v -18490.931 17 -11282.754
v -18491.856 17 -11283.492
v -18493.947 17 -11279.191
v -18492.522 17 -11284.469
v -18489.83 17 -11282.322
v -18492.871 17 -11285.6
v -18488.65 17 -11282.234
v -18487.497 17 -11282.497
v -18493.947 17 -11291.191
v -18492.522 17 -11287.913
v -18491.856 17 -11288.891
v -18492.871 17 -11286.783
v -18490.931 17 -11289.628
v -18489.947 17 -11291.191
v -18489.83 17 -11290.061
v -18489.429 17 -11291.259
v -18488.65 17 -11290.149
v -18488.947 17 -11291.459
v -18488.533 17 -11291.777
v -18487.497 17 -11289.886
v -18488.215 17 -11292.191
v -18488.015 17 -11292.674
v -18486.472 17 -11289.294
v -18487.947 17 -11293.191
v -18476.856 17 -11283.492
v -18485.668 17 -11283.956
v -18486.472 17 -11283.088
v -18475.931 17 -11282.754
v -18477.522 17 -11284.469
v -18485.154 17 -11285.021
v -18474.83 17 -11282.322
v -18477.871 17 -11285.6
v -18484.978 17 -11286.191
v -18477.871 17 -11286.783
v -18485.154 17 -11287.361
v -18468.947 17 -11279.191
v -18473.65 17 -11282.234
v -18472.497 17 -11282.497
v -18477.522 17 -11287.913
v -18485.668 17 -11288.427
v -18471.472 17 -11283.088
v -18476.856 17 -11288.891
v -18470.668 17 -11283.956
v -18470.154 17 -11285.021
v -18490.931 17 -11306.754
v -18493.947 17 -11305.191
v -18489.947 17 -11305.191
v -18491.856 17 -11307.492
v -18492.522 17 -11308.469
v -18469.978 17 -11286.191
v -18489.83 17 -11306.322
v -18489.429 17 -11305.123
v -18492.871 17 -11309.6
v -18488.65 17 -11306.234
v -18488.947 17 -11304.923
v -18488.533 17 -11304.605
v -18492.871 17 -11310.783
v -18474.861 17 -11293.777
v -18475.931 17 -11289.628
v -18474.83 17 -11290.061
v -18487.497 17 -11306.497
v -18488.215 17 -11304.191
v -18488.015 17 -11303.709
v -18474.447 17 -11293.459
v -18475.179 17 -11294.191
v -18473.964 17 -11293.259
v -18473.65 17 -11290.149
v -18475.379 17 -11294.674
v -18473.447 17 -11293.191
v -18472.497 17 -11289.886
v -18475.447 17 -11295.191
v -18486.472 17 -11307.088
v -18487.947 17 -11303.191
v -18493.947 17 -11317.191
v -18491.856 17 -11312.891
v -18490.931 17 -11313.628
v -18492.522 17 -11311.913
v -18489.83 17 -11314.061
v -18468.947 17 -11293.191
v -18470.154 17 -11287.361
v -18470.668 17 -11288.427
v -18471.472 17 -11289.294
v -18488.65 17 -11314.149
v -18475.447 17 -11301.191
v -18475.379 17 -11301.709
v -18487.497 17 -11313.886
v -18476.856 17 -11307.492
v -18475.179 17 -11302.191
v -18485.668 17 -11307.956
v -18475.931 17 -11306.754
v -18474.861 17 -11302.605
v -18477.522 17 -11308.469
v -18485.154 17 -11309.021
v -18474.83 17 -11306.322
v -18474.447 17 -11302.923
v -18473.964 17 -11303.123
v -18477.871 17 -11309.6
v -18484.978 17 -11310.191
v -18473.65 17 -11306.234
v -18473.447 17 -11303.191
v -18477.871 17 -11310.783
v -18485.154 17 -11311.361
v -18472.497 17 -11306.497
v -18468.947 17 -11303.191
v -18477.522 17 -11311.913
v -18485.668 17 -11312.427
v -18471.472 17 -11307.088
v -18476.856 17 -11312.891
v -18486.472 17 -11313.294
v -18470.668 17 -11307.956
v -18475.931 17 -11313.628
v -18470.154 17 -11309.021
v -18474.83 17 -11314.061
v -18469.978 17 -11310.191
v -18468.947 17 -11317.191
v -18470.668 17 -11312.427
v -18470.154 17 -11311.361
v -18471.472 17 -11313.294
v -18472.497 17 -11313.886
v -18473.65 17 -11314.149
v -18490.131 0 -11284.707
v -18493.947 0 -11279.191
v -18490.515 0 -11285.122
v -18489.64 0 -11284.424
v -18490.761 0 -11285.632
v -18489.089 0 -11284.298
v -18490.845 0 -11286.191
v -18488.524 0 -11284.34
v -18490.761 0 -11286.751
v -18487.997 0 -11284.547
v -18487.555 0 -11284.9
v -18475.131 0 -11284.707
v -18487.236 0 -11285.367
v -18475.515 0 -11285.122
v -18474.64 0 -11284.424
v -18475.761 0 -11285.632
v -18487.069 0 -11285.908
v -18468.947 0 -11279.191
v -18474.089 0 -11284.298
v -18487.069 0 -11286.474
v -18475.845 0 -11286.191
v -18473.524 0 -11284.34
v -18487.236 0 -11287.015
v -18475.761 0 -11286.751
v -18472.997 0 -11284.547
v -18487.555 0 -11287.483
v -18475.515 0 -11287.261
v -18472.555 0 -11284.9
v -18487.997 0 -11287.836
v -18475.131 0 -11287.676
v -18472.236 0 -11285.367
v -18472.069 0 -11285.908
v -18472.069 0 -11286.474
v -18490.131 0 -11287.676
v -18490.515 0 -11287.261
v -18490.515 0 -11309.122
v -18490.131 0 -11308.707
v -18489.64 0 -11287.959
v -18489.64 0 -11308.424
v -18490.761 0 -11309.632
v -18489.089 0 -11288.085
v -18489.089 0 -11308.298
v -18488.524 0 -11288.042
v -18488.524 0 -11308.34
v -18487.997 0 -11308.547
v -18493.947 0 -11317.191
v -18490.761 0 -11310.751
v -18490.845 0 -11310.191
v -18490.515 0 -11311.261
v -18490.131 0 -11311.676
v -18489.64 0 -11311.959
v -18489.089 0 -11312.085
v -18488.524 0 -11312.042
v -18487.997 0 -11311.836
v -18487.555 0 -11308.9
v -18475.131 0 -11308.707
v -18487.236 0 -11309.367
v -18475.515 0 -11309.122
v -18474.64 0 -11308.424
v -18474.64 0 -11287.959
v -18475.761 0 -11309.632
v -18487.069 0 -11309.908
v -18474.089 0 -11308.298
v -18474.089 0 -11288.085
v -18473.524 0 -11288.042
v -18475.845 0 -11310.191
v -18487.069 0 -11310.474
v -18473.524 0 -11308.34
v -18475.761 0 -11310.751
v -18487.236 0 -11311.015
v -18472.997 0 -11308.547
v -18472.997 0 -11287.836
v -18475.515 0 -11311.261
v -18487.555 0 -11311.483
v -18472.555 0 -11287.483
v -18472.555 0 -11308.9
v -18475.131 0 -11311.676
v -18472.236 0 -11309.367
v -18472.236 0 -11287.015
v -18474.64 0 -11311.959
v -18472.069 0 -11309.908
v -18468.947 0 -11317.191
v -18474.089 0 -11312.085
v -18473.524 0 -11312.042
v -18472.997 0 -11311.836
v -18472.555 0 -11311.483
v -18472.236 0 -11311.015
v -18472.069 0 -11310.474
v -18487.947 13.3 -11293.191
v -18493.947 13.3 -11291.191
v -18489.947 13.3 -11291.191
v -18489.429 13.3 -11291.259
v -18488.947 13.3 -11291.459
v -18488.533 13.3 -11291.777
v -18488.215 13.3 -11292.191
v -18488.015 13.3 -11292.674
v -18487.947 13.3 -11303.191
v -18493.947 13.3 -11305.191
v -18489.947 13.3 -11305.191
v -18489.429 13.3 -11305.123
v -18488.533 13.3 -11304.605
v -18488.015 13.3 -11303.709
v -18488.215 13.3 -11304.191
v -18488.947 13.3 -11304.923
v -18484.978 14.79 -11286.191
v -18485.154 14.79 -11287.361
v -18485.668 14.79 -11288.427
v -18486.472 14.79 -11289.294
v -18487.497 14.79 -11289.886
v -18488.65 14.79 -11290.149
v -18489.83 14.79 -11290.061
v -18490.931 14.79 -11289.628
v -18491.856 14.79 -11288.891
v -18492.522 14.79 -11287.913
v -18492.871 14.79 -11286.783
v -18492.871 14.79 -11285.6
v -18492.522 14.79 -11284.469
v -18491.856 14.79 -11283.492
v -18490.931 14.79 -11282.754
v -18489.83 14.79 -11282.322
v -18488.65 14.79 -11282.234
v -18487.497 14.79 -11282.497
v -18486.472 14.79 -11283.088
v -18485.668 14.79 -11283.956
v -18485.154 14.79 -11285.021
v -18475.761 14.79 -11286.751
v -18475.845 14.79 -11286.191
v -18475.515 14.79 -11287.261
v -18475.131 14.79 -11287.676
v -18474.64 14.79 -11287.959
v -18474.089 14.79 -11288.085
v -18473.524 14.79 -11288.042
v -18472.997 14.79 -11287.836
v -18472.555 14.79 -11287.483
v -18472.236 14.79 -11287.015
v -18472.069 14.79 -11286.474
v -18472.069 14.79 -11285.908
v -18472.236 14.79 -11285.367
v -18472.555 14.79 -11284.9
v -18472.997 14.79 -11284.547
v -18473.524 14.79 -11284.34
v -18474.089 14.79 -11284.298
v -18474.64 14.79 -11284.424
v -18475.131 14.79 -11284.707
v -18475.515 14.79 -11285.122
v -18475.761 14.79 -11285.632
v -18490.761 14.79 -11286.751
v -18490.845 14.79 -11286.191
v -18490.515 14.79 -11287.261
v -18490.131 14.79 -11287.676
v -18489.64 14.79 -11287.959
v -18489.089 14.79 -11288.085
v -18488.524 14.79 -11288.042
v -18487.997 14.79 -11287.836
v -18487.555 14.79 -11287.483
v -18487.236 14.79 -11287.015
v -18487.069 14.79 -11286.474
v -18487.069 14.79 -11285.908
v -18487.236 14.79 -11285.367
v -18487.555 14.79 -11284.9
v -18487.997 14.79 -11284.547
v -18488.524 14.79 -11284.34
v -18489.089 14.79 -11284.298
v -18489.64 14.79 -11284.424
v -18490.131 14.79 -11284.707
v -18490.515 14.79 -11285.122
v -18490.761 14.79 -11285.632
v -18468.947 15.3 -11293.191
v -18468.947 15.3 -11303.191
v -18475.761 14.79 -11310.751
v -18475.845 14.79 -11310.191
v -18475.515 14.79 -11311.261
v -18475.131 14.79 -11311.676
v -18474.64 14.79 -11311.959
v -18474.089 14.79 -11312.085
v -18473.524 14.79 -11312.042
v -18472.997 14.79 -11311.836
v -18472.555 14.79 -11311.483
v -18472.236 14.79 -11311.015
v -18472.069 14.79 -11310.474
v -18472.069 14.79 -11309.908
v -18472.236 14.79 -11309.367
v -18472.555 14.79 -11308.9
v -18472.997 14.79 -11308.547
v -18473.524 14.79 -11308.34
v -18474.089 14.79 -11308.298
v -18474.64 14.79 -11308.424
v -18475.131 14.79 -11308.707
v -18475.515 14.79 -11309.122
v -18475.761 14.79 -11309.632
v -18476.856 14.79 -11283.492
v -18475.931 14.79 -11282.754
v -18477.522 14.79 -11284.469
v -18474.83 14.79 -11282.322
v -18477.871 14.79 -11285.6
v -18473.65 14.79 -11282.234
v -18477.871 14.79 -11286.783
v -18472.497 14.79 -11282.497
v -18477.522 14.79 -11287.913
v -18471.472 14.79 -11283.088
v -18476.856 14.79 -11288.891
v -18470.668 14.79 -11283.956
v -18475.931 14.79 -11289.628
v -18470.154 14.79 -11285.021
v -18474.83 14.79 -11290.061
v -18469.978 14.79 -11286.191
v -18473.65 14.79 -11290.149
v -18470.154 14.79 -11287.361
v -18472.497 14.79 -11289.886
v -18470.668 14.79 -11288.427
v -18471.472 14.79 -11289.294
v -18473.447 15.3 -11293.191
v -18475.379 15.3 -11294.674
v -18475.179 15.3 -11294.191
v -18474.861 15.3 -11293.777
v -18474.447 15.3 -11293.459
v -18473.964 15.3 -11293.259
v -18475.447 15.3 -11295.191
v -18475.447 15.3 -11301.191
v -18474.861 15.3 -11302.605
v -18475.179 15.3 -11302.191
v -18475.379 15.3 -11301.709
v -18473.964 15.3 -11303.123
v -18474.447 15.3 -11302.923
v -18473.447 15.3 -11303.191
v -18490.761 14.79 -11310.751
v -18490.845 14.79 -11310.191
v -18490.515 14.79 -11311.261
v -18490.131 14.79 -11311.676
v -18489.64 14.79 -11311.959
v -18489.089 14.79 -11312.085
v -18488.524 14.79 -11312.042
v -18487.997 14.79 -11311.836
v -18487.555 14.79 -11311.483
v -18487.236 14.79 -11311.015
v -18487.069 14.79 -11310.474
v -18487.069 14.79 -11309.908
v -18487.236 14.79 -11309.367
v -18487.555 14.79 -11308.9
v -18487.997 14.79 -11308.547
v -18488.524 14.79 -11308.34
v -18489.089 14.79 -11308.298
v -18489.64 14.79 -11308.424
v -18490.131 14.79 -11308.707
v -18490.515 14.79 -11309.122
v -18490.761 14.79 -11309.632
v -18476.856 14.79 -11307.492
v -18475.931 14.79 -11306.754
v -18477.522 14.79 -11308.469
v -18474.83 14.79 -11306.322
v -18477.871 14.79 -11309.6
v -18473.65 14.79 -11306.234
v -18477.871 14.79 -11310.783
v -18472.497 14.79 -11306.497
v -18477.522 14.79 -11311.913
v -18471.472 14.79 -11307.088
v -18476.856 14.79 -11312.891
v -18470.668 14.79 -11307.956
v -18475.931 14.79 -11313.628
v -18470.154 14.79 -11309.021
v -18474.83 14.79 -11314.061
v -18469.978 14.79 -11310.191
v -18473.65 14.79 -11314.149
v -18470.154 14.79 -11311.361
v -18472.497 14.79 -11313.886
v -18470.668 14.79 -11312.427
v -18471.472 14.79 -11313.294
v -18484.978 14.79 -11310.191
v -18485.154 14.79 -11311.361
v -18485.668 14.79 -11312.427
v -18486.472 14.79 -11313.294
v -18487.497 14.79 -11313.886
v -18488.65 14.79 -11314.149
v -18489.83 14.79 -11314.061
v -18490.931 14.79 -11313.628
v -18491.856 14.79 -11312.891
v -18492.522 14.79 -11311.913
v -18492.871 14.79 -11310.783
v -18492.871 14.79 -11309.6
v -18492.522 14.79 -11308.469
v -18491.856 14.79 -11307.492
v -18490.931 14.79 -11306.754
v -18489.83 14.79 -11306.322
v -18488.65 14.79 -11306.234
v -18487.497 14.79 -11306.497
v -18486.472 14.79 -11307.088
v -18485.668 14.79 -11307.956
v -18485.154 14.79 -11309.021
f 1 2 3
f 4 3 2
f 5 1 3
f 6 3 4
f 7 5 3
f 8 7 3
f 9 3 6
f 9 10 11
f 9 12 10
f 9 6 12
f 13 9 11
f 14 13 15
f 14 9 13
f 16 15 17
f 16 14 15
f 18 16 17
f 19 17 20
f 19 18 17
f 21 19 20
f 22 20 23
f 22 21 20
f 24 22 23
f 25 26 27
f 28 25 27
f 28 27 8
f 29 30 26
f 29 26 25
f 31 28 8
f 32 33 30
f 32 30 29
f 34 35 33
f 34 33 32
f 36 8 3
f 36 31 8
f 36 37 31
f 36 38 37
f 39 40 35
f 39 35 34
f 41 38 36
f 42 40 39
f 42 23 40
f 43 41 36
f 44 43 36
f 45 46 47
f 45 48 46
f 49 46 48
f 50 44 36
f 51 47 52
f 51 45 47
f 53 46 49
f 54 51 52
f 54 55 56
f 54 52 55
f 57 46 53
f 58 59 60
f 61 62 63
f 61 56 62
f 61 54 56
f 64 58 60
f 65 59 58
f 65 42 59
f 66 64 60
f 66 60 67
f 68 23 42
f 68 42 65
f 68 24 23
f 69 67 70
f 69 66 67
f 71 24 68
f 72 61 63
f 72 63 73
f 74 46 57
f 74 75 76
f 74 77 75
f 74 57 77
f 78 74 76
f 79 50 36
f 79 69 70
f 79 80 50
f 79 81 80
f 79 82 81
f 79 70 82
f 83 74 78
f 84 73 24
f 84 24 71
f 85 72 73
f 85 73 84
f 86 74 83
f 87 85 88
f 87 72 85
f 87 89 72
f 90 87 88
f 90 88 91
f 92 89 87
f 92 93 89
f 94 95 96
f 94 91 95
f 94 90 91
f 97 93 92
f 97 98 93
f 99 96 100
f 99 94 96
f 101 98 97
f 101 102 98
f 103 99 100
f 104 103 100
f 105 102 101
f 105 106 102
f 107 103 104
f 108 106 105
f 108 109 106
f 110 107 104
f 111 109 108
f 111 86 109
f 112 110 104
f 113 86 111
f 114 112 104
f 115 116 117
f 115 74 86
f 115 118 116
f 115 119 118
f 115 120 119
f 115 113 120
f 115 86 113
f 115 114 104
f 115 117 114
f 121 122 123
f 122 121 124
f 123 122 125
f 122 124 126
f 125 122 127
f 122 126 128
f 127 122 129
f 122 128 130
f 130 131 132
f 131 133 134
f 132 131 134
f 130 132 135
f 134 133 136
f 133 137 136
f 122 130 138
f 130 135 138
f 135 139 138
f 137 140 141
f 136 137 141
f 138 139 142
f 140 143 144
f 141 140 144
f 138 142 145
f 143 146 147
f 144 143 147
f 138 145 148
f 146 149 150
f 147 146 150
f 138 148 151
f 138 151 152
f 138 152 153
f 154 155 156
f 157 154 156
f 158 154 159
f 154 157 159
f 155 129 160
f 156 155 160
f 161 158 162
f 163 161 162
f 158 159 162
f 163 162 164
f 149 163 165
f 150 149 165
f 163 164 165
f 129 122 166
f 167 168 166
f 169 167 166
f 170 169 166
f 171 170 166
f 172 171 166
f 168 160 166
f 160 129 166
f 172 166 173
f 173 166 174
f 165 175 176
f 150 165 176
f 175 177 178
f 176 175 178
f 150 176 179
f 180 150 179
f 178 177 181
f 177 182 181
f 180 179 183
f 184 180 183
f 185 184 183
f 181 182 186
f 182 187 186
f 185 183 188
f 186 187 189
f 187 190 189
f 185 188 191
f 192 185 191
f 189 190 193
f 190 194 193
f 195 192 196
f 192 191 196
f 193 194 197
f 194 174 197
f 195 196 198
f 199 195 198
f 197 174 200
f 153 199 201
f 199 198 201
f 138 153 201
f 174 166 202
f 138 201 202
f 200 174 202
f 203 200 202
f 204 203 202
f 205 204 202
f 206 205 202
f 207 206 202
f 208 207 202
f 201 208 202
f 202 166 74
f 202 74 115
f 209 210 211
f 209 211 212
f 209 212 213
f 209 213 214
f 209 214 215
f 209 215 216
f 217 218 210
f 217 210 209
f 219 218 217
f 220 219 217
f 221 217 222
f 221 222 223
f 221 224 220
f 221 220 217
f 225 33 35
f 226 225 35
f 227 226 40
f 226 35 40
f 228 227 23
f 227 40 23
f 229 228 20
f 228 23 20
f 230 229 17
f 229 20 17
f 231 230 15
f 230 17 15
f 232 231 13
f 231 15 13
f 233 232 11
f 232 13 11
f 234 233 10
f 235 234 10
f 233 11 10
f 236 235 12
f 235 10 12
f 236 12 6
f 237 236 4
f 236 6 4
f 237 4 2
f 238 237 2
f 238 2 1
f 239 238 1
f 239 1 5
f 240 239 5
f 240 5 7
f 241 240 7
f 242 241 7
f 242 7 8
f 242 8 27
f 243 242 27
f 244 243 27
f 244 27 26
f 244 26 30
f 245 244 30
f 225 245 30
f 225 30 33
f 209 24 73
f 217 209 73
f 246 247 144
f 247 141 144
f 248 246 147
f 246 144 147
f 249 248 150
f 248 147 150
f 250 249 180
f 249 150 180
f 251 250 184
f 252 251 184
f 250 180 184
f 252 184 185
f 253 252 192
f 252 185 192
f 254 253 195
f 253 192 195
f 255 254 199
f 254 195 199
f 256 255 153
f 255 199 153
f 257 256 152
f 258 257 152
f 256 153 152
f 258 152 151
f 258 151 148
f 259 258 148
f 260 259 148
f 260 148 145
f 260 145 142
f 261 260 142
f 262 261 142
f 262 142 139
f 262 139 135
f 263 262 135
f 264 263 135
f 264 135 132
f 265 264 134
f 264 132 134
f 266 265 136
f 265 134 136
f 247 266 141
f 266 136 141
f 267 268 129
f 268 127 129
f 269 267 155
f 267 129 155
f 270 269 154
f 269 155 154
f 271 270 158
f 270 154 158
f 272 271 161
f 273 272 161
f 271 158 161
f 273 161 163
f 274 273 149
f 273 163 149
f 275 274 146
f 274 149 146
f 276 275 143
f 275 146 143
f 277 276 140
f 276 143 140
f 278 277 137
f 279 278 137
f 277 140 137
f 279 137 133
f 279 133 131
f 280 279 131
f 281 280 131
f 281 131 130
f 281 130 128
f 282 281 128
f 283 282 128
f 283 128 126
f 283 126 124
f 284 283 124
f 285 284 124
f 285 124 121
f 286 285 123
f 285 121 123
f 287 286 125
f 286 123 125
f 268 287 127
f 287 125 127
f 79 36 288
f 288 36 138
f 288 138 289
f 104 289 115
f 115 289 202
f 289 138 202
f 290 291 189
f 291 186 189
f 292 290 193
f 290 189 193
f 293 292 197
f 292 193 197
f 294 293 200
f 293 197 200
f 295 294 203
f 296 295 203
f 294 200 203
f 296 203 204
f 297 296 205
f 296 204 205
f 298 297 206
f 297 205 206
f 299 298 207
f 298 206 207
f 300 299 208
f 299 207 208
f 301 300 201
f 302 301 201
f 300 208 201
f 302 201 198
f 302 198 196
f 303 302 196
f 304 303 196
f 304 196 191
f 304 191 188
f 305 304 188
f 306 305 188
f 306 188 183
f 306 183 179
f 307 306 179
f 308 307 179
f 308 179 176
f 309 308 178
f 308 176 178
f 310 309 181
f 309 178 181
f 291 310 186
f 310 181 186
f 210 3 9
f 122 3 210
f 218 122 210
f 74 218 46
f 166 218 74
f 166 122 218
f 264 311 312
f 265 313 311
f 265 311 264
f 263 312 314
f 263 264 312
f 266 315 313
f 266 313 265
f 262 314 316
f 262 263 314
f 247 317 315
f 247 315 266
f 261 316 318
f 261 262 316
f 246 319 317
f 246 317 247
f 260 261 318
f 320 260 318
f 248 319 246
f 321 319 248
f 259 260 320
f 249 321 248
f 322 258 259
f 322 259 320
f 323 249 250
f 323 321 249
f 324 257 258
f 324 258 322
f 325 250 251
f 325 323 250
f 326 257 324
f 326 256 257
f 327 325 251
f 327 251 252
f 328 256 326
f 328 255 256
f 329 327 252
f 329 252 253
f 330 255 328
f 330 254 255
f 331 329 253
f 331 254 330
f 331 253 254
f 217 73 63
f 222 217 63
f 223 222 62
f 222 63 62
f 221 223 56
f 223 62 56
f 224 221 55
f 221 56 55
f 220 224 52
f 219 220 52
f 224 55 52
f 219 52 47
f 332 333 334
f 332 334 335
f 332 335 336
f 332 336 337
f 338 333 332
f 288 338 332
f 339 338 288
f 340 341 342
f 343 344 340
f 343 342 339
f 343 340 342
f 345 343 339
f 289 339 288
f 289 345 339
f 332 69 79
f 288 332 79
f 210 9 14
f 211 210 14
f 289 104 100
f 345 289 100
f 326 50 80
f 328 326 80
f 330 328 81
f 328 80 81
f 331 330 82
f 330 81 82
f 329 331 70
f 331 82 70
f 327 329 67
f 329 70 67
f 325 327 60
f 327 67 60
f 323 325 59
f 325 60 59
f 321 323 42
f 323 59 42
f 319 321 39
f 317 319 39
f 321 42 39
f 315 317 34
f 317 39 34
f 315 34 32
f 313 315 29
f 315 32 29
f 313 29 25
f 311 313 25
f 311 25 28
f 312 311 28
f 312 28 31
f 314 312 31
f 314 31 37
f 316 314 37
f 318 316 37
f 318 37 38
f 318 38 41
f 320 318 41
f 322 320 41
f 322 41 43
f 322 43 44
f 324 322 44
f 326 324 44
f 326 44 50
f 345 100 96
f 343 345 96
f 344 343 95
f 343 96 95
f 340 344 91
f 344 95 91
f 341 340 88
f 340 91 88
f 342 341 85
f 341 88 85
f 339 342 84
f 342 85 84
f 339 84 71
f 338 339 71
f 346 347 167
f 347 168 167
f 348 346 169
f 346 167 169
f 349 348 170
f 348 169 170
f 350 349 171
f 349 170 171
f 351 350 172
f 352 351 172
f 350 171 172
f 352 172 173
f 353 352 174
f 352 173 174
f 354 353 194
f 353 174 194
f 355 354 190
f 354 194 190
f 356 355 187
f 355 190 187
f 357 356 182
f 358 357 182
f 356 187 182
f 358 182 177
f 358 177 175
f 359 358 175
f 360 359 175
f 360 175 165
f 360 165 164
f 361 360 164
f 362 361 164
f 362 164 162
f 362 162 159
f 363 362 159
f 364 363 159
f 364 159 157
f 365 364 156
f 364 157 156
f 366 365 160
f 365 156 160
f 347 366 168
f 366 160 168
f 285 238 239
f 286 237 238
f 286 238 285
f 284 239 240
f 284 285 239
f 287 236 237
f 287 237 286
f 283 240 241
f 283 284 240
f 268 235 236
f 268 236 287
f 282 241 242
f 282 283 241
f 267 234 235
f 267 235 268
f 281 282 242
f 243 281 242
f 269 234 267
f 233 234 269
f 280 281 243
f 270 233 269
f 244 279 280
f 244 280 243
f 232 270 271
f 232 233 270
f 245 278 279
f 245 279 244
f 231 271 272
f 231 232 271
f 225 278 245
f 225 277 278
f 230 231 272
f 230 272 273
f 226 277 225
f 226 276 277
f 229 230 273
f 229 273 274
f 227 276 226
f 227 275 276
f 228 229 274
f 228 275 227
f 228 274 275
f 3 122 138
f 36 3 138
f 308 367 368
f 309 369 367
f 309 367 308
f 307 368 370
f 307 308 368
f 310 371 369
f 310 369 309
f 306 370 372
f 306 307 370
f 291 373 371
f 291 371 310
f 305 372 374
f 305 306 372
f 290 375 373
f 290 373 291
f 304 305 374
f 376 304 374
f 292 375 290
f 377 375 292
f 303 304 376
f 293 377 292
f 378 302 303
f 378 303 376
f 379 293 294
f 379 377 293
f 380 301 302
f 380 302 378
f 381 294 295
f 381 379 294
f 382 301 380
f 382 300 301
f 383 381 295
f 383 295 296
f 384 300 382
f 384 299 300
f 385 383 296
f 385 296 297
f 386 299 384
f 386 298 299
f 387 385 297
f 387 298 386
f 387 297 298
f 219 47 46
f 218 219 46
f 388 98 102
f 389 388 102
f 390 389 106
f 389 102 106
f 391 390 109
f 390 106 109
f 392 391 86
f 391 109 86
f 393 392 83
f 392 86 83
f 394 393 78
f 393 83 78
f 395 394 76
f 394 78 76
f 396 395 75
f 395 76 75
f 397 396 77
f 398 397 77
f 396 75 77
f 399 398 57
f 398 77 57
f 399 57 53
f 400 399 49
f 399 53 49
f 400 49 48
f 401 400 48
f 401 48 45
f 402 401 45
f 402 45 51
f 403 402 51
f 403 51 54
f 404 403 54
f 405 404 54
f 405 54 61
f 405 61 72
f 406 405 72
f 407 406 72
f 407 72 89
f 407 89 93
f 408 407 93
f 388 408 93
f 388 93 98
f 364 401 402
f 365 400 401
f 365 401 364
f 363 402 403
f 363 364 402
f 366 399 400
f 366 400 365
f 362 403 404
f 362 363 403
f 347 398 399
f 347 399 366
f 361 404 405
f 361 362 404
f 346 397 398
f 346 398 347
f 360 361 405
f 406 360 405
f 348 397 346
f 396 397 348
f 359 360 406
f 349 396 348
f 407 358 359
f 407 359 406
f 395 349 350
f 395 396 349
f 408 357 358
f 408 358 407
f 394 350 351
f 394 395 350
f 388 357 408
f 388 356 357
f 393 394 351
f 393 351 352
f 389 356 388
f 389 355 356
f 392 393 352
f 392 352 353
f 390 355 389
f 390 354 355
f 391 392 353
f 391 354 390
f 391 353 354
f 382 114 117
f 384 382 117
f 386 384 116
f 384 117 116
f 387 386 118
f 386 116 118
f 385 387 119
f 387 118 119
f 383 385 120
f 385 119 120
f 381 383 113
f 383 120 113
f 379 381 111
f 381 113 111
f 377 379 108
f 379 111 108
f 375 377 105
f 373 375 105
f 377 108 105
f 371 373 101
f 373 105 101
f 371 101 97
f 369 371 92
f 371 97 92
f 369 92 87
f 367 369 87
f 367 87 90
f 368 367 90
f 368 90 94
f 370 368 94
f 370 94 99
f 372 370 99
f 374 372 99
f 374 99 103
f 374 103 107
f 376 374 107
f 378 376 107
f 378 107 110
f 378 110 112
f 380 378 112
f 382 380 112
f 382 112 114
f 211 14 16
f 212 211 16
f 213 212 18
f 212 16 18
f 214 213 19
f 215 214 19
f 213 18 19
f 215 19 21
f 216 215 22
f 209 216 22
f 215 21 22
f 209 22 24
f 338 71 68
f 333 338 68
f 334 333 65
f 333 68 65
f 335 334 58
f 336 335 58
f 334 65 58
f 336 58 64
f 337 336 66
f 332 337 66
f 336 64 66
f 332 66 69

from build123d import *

# Parameters (mm, degrees)
SKETCH1_W                                           = 25
SKETCH1_H                                           = 38
BOSS_EXTRUDE1_DEPTH                                 = 17
CUT_EXTRUDE3_DEPTH                                  = 3.7
CUT_EXTRUDE4_DEPTH                                  = 1.7
CBORE_FOR_6_BINDING_HEAD_MACHINE_SCREW1_D           = 3.7973
CBORE_FOR_6_BINDING_HEAD_MACHINE_SCREW1_CBORE_D     = 7.9375
CBORE_FOR_6_BINDING_HEAD_MACHINE_SCREW1_CBORE_DEPTH = 2.2098


with BuildPart() as part:
    # Sketch1 → Boss-Extrude1 (new body)
    with BuildSketch(Plane(origin=(0, 0, 0), x_dir=(1, 0, 0), z_dir=(0, 1, 0))):
        with Locations((-18481.446731235, 11298.191283293)):
            Rectangle(SKETCH1_W, SKETCH1_H)
    extrude(amount=BOSS_EXTRUDE1_DEPTH)

    # Sketch2 → Cut-Extrude3 (cut)
    with BuildSketch(Plane(origin=(0, 17, 0), x_dir=(1, 0, 0), z_dir=(0, 1, 0))):
        with BuildLine():
            Line((-18493.946731235, 11291.191283293), (-18489.946731235, 11291.191283293))
            ThreePointArc((-18489.946731235, 11291.191283293), (-18488.532517672, 11291.777069731), (-18487.946731235, 11293.191283293))
            Line((-18487.946731235, 11293.191283293), (-18487.946731235, 11303.191283293))
            ThreePointArc((-18487.946731235, 11303.191283293), (-18488.532517672, 11304.605496855), (-18489.946731235, 11305.191283293))
            Line((-18489.946731235, 11305.191283293), (-18493.946731235, 11305.191283293))
            Line((-18493.946731235, 11305.191283293), (-18493.946731235, 11291.191283293))
        make_face()
    extrude(amount=-CUT_EXTRUDE3_DEPTH, mode=Mode.SUBTRACT)

    # Sketch2<6> → Cut-Extrude4 (cut)
    with BuildSketch(Plane(origin=(0, 17, 0), x_dir=(1, 0, 0), z_dir=(0, 1, 0))):
        with BuildLine():
            Line((-18475.446731235, 11301.191283293), (-18475.446731235, 11295.191283293))
            ThreePointArc((-18475.446731235, 11295.191283293), (-18474.860944797, 11293.777069731), (-18473.446731235, 11293.191283293))
            Line((-18473.446731235, 11293.191283293), (-18468.946731235, 11293.191283293))
            Line((-18468.946731235, 11293.191283293), (-18468.946731235, 11303.191283293))
            Line((-18468.946731235, 11303.191283293), (-18473.446731235, 11303.191283293))
            ThreePointArc((-18473.446731235, 11303.191283293), (-18474.860944797, 11302.605496855), (-18475.446731235, 11301.191283293))
        make_face()
    extrude(amount=-CUT_EXTRUDE4_DEPTH, mode=Mode.SUBTRACT)

    # CBORE for #6 Binding Head Machine Screw1 (through all)
    with Locations(Plane(origin=(0, 17, 0), x_dir=(1, 0, 0), z_dir=(0, 1, 0))):
        with Locations((-18488.946731235, 11310.191283293), (-18473.946731235, 11310.191283293), (-18473.946731235, 11286.191283293), (-18488.946731235, 11286.191283293)):
            CounterBoreHole(CBORE_FOR_6_BINDING_HEAD_MACHINE_SCREW1_D / 2, CBORE_FOR_6_BINDING_HEAD_MACHINE_SCREW1_CBORE_D / 2, CBORE_FOR_6_BINDING_HEAD_MACHINE_SCREW1_CBORE_DEPTH)


solid = part.part
